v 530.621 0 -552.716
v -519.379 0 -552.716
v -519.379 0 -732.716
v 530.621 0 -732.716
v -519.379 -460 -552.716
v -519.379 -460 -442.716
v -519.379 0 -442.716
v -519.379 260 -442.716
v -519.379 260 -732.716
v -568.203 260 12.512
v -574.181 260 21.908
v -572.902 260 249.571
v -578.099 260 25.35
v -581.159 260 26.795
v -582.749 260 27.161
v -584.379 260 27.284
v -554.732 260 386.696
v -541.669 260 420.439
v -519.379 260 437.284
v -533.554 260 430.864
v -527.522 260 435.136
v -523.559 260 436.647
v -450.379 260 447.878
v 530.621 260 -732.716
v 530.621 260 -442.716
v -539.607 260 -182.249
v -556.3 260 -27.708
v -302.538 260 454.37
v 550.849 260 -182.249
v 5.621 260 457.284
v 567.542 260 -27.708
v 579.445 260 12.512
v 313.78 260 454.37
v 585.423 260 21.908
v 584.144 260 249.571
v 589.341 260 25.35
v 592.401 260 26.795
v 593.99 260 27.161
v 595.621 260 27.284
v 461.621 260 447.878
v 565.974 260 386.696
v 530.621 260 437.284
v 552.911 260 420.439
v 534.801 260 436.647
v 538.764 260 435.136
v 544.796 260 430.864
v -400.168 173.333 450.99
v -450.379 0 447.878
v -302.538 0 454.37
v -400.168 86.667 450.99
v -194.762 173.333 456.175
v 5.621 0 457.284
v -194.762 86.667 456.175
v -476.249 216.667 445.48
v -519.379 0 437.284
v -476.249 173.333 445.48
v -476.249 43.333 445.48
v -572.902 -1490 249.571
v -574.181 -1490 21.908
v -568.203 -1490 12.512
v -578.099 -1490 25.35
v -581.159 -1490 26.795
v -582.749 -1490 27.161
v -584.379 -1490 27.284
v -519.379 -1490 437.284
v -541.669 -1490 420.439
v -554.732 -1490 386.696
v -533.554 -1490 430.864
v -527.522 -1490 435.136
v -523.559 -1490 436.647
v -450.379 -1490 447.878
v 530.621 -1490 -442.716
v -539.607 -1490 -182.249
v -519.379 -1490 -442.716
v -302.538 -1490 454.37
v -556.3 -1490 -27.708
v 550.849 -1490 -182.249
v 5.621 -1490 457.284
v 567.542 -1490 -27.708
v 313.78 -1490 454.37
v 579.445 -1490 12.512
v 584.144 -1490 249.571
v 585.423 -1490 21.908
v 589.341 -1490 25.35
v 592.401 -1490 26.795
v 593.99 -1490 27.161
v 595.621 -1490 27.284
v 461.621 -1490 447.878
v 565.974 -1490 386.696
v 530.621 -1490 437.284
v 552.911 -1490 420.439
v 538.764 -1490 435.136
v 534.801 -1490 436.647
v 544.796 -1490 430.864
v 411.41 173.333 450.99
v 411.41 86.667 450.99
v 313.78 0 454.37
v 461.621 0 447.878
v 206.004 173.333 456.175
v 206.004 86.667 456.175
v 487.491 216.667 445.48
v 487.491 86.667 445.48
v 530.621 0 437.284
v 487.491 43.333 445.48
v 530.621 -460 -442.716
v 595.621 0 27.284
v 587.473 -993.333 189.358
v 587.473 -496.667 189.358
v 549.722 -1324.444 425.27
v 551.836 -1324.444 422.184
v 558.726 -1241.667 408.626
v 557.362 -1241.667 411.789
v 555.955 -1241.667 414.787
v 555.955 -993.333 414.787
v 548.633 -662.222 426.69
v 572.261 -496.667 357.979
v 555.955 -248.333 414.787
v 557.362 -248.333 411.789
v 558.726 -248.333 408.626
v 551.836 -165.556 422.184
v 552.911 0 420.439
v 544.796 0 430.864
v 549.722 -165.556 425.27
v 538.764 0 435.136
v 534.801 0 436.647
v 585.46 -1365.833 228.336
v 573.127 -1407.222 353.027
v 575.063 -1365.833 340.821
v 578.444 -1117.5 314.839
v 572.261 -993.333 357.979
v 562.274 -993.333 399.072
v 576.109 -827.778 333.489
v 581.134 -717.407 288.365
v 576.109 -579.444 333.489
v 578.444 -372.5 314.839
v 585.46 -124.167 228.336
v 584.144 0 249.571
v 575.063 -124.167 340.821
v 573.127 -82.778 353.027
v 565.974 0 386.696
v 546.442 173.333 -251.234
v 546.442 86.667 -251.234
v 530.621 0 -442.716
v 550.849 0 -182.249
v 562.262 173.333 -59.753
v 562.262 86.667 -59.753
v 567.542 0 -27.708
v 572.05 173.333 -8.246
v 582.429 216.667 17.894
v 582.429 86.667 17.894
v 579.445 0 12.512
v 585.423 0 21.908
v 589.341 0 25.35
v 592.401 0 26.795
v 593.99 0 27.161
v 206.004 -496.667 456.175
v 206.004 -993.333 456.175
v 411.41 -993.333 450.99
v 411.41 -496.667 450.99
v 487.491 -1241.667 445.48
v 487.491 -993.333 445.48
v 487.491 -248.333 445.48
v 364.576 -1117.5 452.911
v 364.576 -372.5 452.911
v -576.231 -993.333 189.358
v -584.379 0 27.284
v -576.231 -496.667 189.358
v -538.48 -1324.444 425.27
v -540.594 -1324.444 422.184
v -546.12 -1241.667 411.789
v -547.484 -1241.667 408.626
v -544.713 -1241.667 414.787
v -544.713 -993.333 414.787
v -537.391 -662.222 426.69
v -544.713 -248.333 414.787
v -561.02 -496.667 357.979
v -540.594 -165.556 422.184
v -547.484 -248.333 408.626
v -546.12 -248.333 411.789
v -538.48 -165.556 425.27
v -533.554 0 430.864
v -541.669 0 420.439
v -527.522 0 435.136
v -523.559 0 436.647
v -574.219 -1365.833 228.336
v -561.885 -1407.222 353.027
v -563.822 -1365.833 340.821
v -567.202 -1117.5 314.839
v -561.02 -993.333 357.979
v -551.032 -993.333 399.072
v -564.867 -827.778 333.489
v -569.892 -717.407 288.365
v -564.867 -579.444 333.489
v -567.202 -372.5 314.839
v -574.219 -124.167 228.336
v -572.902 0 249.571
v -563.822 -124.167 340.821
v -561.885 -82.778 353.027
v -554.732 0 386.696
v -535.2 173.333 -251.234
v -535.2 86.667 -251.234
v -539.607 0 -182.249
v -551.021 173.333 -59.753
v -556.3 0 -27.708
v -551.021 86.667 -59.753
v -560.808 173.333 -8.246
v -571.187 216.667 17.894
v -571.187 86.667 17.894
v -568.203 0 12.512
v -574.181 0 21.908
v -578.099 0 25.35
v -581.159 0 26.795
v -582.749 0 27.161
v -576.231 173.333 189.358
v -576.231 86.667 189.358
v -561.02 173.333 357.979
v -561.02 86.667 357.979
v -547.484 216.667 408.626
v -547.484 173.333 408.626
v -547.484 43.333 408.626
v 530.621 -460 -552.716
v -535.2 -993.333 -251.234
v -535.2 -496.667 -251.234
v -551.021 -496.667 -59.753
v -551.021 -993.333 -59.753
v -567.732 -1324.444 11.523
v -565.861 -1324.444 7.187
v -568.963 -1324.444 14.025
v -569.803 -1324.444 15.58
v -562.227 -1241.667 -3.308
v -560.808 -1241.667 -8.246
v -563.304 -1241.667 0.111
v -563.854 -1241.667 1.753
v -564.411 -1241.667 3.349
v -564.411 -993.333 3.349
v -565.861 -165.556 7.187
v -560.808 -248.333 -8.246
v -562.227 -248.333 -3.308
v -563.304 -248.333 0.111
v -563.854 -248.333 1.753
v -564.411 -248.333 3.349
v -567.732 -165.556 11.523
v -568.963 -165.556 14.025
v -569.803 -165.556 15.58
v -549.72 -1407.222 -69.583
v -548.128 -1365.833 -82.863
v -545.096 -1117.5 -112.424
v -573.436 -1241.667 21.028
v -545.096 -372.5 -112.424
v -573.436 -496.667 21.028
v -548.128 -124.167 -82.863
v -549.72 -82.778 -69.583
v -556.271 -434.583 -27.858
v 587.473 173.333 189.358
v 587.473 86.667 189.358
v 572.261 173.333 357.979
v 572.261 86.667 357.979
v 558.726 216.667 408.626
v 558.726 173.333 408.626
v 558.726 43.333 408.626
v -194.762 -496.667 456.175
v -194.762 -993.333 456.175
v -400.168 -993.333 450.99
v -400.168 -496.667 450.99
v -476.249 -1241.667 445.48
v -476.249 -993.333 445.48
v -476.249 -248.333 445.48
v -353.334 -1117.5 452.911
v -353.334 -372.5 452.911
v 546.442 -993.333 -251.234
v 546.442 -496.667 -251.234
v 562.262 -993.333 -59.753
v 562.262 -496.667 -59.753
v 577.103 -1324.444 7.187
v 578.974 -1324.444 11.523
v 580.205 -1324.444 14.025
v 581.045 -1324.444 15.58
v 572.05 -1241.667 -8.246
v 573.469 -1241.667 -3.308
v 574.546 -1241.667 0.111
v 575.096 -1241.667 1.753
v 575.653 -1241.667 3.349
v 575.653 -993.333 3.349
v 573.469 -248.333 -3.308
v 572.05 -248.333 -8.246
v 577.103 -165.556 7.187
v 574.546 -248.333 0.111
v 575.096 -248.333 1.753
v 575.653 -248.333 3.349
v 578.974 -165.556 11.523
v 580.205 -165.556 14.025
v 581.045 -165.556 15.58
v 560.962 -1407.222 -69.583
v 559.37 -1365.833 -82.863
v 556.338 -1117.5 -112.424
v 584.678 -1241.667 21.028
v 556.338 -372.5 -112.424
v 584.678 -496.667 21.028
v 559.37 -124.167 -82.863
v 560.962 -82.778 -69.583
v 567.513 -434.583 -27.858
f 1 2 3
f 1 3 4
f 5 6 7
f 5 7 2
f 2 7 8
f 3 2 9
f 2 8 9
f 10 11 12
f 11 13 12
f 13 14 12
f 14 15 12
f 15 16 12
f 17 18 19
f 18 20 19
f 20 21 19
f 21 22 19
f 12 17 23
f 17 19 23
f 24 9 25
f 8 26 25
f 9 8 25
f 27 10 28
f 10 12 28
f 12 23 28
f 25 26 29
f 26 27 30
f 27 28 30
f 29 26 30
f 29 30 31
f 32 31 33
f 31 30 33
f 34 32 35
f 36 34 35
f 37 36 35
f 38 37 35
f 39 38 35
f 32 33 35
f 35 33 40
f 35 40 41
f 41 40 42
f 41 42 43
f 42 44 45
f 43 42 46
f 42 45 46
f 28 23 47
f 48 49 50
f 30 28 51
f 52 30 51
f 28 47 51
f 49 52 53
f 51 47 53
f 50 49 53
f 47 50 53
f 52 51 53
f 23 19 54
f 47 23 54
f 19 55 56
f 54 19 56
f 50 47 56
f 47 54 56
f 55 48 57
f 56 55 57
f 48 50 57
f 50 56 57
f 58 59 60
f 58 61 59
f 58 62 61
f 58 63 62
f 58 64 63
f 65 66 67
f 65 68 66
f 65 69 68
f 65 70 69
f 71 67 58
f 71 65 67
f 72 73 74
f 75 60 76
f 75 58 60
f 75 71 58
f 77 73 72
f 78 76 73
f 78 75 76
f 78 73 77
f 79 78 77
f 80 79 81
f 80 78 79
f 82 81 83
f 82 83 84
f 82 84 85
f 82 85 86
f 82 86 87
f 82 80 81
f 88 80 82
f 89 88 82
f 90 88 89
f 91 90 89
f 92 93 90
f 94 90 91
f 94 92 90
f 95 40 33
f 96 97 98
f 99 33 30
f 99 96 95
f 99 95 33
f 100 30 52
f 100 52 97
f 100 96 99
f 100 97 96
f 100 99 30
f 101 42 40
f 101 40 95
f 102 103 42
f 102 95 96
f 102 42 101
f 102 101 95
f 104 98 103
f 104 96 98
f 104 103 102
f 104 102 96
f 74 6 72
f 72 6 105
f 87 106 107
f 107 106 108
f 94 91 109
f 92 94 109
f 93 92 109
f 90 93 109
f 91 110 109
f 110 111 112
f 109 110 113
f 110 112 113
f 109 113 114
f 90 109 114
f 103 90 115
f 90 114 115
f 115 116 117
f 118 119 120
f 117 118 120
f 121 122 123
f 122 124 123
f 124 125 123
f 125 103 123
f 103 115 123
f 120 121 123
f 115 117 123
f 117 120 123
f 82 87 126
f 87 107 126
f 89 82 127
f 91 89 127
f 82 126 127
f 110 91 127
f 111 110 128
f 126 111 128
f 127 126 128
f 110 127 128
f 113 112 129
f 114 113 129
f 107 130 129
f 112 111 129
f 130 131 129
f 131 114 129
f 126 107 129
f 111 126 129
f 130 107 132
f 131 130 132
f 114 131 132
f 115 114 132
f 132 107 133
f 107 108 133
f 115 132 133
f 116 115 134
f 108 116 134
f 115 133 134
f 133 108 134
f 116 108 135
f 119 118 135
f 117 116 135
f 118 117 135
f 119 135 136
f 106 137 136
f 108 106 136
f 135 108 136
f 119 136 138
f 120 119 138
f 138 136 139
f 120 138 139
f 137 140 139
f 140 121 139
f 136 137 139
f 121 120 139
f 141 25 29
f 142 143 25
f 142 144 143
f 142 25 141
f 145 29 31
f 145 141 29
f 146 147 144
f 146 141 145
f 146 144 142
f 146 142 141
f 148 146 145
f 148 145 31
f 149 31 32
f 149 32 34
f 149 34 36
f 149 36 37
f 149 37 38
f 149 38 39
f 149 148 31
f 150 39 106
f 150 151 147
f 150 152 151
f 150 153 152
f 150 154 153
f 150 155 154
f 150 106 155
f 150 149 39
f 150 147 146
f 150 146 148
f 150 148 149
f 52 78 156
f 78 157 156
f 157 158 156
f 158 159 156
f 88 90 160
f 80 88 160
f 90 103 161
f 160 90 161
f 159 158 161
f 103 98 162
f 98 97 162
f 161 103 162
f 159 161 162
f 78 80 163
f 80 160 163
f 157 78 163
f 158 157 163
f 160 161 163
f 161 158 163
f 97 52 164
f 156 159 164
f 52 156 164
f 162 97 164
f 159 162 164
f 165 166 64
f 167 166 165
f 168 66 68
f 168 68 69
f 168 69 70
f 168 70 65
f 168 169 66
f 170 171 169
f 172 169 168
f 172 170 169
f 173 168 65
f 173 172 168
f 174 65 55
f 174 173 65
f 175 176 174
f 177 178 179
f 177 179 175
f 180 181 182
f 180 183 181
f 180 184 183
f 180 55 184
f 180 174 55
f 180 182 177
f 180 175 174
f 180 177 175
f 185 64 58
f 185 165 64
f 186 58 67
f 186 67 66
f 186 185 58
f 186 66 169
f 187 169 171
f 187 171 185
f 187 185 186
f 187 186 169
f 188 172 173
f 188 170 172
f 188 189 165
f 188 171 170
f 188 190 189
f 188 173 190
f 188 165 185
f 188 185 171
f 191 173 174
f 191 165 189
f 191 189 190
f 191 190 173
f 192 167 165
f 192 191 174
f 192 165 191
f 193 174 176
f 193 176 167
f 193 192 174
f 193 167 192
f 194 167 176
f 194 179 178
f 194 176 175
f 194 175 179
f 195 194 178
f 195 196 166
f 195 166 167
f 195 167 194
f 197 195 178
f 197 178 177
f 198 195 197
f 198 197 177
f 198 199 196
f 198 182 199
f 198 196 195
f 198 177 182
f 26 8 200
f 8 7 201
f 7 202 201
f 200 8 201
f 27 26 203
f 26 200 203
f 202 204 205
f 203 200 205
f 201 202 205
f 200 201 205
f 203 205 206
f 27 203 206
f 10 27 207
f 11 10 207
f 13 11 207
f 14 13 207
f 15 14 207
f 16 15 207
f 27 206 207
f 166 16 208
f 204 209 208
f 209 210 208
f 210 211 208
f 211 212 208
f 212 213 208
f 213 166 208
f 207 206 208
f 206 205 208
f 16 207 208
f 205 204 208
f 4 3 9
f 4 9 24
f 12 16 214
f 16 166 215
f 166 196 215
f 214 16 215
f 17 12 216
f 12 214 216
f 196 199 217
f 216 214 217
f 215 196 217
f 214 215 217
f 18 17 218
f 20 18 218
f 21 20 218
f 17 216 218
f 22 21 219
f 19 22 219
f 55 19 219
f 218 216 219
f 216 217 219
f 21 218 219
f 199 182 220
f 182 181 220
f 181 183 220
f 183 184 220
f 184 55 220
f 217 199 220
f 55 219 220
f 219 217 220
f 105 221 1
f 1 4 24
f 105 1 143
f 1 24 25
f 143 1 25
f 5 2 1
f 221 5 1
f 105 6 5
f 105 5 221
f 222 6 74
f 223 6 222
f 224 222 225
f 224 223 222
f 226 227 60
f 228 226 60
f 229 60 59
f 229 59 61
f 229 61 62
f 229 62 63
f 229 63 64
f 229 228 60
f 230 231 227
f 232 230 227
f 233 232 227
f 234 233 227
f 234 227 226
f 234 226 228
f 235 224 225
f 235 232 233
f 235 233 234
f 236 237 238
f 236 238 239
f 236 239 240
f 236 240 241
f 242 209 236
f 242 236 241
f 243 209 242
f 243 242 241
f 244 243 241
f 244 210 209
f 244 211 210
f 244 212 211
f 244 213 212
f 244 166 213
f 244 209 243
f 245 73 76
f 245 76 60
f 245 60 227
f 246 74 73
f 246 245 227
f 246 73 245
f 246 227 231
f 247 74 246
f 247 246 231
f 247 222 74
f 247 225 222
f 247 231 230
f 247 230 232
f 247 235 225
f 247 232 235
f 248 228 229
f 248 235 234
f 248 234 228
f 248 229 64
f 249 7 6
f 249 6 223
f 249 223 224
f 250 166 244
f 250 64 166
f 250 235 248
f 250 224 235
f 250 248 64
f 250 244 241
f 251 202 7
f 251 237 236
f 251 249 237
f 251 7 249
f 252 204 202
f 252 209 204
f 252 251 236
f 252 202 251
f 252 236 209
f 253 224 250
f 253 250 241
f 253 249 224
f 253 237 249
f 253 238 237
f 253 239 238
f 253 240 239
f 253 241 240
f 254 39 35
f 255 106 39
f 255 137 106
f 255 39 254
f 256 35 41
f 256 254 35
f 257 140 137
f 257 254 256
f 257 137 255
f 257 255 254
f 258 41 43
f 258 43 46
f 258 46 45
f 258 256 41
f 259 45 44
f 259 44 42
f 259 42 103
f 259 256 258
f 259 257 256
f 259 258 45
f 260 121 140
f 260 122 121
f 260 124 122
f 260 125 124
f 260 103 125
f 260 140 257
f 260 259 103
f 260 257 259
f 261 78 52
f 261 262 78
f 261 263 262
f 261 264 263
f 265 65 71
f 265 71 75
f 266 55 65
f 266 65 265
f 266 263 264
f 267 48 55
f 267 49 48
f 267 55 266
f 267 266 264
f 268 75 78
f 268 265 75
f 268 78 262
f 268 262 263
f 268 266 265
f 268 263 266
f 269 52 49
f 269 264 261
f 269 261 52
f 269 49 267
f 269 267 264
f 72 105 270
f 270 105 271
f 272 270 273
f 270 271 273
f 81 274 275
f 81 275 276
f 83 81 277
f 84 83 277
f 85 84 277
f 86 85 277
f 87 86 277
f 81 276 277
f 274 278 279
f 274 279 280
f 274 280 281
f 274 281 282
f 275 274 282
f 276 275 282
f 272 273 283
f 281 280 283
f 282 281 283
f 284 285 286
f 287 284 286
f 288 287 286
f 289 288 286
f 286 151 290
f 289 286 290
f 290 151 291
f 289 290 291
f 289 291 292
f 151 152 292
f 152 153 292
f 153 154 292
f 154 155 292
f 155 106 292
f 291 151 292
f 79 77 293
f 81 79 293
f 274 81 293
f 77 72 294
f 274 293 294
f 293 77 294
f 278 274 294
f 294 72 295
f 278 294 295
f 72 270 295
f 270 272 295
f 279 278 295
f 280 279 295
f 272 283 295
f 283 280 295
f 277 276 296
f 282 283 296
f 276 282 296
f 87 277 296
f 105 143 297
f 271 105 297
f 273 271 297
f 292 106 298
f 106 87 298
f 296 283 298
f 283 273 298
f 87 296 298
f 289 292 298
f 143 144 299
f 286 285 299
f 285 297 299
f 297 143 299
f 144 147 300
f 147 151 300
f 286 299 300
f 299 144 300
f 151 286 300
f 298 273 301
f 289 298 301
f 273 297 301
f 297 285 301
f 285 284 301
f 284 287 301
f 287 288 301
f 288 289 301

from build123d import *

# Parameters (mm, degrees)
F1_DEPTH = 260
F2_DEPTH = 260
F0_W     = 1050
F0_H     = 180
F3_DEPTH = 260
F4_DEPTH = 1490
F5_DEPTH = 460


with BuildPart() as f1:
    # F0 (on Front) → F1 (new body)
    with BuildSketch(Plane.XZ):
        with BuildLine():
            Line((-519.379077, -442.715838), (5.620923, -442.715838))
            Line((5.620923, -442.715838), (530.620923, -442.715838))
            add(Edge.make_bspline(
                [(530.620923, -442.715838), (552.28759, -286.049171), (547.647588, 27.284162), (595.620923, 27.284162)],
                knots=[0, 0, 0, 0, 474.473392, 474.473392, 474.473392, 474.473392], degree=3))
            add(Edge.make_bspline(
                [(595.620923, 27.284162), (584.550135, 154.130891), (591.930621, 434.590191), (530.620923, 437.284162)],
                knots=[0, 0, 0, 0, 415.120464, 415.120464, 415.120464, 415.120464], degree=3))
            add(Edge.make_bspline(
                [(530.620923, 437.284162), (484.913282, 456.731707), (173.086815, 456.731707), (5.620923, 457.284162)],
                knots=[0, 0, 0, 0, 525.380814, 525.380814, 525.380814, 525.380814], degree=3))
            add(Edge.make_bspline(
                [(-519.379077, 437.284162), (-473.671436, 456.731707), (-161.844969, 456.731707), (5.620923, 457.284162)],
                knots=[0, 0, 0, 0, 525.380814, 525.380814, 525.380814, 525.380814], degree=3))
            add(Edge.make_bspline(
                [(-584.379077, 27.284162), (-573.308289, 154.130891), (-580.688775, 434.590191), (-519.379077, 437.284162)],
                knots=[0, 0, 0, 0, 415.120464, 415.120464, 415.120464, 415.120464], degree=3))
            add(Edge.make_bspline(
                [(-519.379077, -442.715838), (-541.045744, -286.049171), (-536.405742, 27.284162), (-584.379077, 27.284162)],
                knots=[0, 0, 0, 0, 474.473392, 474.473392, 474.473392, 474.473392], degree=3))
        make_face()
    extrude(amount=-F1_DEPTH)

    # F0 (on Front) → F2 (join)
    with BuildSketch(Plane.XZ):
        Polygon((530.620923, -442.715838), (5.620923, -442.715838), (-519.379077, -442.715838), (-519.379077, -552.715838), (530.620923, -552.715838), align=None)
    extrude(amount=-F2_DEPTH)

    # F0 (on Front) → F3 (join)
    with BuildSketch(Plane.XZ):
        with Locations((5.620923, -642.715838)):
            Rectangle(F0_W, F0_H)
    extrude(amount=-F3_DEPTH)

    # F0 (on Front) → F4 (join)
    with BuildSketch(Plane.XZ):
        with BuildLine():
            Line((-519.379077, -442.715838), (5.620923, -442.715838))
            Line((5.620923, -442.715838), (530.620923, -442.715838))
            add(Edge.make_bspline(
                [(530.620923, -442.715838), (552.28759, -286.049171), (547.647588, 27.284162), (595.620923, 27.284162)],
                knots=[0, 0, 0, 0, 474.473392, 474.473392, 474.473392, 474.473392], degree=3))
            add(Edge.make_bspline(
                [(595.620923, 27.284162), (584.550135, 154.130891), (591.930621, 434.590191), (530.620923, 437.284162)],
                knots=[0, 0, 0, 0, 415.120464, 415.120464, 415.120464, 415.120464], degree=3))
            add(Edge.make_bspline(
                [(530.620923, 437.284162), (484.913282, 456.731707), (173.086815, 456.731707), (5.620923, 457.284162)],
                knots=[0, 0, 0, 0, 525.380814, 525.380814, 525.380814, 525.380814], degree=3))
            add(Edge.make_bspline(
                [(-519.379077, 437.284162), (-473.671436, 456.731707), (-161.844969, 456.731707), (5.620923, 457.284162)],
                knots=[0, 0, 0, 0, 525.380814, 525.380814, 525.380814, 525.380814], degree=3))
            add(Edge.make_bspline(
                [(-584.379077, 27.284162), (-573.308289, 154.130891), (-580.688775, 434.590191), (-519.379077, 437.284162)],
                knots=[0, 0, 0, 0, 415.120464, 415.120464, 415.120464, 415.120464], degree=3))
            add(Edge.make_bspline(
                [(-519.379077, -442.715838), (-541.045744, -286.049171), (-536.405742, 27.284162), (-584.379077, 27.284162)],
                knots=[0, 0, 0, 0, 474.473392, 474.473392, 474.473392, 474.473392], degree=3))
        make_face()
    extrude(amount=F4_DEPTH)

    # F0 (on Front) → F5 (join)
    with BuildSketch(Plane.XZ):
        Polygon((530.620923, -442.715838), (5.620923, -442.715838), (-519.379077, -442.715838), (-519.379077, -552.715838), (530.620923, -552.715838), align=None)
    extrude(amount=F5_DEPTH)


solid = f1.part
